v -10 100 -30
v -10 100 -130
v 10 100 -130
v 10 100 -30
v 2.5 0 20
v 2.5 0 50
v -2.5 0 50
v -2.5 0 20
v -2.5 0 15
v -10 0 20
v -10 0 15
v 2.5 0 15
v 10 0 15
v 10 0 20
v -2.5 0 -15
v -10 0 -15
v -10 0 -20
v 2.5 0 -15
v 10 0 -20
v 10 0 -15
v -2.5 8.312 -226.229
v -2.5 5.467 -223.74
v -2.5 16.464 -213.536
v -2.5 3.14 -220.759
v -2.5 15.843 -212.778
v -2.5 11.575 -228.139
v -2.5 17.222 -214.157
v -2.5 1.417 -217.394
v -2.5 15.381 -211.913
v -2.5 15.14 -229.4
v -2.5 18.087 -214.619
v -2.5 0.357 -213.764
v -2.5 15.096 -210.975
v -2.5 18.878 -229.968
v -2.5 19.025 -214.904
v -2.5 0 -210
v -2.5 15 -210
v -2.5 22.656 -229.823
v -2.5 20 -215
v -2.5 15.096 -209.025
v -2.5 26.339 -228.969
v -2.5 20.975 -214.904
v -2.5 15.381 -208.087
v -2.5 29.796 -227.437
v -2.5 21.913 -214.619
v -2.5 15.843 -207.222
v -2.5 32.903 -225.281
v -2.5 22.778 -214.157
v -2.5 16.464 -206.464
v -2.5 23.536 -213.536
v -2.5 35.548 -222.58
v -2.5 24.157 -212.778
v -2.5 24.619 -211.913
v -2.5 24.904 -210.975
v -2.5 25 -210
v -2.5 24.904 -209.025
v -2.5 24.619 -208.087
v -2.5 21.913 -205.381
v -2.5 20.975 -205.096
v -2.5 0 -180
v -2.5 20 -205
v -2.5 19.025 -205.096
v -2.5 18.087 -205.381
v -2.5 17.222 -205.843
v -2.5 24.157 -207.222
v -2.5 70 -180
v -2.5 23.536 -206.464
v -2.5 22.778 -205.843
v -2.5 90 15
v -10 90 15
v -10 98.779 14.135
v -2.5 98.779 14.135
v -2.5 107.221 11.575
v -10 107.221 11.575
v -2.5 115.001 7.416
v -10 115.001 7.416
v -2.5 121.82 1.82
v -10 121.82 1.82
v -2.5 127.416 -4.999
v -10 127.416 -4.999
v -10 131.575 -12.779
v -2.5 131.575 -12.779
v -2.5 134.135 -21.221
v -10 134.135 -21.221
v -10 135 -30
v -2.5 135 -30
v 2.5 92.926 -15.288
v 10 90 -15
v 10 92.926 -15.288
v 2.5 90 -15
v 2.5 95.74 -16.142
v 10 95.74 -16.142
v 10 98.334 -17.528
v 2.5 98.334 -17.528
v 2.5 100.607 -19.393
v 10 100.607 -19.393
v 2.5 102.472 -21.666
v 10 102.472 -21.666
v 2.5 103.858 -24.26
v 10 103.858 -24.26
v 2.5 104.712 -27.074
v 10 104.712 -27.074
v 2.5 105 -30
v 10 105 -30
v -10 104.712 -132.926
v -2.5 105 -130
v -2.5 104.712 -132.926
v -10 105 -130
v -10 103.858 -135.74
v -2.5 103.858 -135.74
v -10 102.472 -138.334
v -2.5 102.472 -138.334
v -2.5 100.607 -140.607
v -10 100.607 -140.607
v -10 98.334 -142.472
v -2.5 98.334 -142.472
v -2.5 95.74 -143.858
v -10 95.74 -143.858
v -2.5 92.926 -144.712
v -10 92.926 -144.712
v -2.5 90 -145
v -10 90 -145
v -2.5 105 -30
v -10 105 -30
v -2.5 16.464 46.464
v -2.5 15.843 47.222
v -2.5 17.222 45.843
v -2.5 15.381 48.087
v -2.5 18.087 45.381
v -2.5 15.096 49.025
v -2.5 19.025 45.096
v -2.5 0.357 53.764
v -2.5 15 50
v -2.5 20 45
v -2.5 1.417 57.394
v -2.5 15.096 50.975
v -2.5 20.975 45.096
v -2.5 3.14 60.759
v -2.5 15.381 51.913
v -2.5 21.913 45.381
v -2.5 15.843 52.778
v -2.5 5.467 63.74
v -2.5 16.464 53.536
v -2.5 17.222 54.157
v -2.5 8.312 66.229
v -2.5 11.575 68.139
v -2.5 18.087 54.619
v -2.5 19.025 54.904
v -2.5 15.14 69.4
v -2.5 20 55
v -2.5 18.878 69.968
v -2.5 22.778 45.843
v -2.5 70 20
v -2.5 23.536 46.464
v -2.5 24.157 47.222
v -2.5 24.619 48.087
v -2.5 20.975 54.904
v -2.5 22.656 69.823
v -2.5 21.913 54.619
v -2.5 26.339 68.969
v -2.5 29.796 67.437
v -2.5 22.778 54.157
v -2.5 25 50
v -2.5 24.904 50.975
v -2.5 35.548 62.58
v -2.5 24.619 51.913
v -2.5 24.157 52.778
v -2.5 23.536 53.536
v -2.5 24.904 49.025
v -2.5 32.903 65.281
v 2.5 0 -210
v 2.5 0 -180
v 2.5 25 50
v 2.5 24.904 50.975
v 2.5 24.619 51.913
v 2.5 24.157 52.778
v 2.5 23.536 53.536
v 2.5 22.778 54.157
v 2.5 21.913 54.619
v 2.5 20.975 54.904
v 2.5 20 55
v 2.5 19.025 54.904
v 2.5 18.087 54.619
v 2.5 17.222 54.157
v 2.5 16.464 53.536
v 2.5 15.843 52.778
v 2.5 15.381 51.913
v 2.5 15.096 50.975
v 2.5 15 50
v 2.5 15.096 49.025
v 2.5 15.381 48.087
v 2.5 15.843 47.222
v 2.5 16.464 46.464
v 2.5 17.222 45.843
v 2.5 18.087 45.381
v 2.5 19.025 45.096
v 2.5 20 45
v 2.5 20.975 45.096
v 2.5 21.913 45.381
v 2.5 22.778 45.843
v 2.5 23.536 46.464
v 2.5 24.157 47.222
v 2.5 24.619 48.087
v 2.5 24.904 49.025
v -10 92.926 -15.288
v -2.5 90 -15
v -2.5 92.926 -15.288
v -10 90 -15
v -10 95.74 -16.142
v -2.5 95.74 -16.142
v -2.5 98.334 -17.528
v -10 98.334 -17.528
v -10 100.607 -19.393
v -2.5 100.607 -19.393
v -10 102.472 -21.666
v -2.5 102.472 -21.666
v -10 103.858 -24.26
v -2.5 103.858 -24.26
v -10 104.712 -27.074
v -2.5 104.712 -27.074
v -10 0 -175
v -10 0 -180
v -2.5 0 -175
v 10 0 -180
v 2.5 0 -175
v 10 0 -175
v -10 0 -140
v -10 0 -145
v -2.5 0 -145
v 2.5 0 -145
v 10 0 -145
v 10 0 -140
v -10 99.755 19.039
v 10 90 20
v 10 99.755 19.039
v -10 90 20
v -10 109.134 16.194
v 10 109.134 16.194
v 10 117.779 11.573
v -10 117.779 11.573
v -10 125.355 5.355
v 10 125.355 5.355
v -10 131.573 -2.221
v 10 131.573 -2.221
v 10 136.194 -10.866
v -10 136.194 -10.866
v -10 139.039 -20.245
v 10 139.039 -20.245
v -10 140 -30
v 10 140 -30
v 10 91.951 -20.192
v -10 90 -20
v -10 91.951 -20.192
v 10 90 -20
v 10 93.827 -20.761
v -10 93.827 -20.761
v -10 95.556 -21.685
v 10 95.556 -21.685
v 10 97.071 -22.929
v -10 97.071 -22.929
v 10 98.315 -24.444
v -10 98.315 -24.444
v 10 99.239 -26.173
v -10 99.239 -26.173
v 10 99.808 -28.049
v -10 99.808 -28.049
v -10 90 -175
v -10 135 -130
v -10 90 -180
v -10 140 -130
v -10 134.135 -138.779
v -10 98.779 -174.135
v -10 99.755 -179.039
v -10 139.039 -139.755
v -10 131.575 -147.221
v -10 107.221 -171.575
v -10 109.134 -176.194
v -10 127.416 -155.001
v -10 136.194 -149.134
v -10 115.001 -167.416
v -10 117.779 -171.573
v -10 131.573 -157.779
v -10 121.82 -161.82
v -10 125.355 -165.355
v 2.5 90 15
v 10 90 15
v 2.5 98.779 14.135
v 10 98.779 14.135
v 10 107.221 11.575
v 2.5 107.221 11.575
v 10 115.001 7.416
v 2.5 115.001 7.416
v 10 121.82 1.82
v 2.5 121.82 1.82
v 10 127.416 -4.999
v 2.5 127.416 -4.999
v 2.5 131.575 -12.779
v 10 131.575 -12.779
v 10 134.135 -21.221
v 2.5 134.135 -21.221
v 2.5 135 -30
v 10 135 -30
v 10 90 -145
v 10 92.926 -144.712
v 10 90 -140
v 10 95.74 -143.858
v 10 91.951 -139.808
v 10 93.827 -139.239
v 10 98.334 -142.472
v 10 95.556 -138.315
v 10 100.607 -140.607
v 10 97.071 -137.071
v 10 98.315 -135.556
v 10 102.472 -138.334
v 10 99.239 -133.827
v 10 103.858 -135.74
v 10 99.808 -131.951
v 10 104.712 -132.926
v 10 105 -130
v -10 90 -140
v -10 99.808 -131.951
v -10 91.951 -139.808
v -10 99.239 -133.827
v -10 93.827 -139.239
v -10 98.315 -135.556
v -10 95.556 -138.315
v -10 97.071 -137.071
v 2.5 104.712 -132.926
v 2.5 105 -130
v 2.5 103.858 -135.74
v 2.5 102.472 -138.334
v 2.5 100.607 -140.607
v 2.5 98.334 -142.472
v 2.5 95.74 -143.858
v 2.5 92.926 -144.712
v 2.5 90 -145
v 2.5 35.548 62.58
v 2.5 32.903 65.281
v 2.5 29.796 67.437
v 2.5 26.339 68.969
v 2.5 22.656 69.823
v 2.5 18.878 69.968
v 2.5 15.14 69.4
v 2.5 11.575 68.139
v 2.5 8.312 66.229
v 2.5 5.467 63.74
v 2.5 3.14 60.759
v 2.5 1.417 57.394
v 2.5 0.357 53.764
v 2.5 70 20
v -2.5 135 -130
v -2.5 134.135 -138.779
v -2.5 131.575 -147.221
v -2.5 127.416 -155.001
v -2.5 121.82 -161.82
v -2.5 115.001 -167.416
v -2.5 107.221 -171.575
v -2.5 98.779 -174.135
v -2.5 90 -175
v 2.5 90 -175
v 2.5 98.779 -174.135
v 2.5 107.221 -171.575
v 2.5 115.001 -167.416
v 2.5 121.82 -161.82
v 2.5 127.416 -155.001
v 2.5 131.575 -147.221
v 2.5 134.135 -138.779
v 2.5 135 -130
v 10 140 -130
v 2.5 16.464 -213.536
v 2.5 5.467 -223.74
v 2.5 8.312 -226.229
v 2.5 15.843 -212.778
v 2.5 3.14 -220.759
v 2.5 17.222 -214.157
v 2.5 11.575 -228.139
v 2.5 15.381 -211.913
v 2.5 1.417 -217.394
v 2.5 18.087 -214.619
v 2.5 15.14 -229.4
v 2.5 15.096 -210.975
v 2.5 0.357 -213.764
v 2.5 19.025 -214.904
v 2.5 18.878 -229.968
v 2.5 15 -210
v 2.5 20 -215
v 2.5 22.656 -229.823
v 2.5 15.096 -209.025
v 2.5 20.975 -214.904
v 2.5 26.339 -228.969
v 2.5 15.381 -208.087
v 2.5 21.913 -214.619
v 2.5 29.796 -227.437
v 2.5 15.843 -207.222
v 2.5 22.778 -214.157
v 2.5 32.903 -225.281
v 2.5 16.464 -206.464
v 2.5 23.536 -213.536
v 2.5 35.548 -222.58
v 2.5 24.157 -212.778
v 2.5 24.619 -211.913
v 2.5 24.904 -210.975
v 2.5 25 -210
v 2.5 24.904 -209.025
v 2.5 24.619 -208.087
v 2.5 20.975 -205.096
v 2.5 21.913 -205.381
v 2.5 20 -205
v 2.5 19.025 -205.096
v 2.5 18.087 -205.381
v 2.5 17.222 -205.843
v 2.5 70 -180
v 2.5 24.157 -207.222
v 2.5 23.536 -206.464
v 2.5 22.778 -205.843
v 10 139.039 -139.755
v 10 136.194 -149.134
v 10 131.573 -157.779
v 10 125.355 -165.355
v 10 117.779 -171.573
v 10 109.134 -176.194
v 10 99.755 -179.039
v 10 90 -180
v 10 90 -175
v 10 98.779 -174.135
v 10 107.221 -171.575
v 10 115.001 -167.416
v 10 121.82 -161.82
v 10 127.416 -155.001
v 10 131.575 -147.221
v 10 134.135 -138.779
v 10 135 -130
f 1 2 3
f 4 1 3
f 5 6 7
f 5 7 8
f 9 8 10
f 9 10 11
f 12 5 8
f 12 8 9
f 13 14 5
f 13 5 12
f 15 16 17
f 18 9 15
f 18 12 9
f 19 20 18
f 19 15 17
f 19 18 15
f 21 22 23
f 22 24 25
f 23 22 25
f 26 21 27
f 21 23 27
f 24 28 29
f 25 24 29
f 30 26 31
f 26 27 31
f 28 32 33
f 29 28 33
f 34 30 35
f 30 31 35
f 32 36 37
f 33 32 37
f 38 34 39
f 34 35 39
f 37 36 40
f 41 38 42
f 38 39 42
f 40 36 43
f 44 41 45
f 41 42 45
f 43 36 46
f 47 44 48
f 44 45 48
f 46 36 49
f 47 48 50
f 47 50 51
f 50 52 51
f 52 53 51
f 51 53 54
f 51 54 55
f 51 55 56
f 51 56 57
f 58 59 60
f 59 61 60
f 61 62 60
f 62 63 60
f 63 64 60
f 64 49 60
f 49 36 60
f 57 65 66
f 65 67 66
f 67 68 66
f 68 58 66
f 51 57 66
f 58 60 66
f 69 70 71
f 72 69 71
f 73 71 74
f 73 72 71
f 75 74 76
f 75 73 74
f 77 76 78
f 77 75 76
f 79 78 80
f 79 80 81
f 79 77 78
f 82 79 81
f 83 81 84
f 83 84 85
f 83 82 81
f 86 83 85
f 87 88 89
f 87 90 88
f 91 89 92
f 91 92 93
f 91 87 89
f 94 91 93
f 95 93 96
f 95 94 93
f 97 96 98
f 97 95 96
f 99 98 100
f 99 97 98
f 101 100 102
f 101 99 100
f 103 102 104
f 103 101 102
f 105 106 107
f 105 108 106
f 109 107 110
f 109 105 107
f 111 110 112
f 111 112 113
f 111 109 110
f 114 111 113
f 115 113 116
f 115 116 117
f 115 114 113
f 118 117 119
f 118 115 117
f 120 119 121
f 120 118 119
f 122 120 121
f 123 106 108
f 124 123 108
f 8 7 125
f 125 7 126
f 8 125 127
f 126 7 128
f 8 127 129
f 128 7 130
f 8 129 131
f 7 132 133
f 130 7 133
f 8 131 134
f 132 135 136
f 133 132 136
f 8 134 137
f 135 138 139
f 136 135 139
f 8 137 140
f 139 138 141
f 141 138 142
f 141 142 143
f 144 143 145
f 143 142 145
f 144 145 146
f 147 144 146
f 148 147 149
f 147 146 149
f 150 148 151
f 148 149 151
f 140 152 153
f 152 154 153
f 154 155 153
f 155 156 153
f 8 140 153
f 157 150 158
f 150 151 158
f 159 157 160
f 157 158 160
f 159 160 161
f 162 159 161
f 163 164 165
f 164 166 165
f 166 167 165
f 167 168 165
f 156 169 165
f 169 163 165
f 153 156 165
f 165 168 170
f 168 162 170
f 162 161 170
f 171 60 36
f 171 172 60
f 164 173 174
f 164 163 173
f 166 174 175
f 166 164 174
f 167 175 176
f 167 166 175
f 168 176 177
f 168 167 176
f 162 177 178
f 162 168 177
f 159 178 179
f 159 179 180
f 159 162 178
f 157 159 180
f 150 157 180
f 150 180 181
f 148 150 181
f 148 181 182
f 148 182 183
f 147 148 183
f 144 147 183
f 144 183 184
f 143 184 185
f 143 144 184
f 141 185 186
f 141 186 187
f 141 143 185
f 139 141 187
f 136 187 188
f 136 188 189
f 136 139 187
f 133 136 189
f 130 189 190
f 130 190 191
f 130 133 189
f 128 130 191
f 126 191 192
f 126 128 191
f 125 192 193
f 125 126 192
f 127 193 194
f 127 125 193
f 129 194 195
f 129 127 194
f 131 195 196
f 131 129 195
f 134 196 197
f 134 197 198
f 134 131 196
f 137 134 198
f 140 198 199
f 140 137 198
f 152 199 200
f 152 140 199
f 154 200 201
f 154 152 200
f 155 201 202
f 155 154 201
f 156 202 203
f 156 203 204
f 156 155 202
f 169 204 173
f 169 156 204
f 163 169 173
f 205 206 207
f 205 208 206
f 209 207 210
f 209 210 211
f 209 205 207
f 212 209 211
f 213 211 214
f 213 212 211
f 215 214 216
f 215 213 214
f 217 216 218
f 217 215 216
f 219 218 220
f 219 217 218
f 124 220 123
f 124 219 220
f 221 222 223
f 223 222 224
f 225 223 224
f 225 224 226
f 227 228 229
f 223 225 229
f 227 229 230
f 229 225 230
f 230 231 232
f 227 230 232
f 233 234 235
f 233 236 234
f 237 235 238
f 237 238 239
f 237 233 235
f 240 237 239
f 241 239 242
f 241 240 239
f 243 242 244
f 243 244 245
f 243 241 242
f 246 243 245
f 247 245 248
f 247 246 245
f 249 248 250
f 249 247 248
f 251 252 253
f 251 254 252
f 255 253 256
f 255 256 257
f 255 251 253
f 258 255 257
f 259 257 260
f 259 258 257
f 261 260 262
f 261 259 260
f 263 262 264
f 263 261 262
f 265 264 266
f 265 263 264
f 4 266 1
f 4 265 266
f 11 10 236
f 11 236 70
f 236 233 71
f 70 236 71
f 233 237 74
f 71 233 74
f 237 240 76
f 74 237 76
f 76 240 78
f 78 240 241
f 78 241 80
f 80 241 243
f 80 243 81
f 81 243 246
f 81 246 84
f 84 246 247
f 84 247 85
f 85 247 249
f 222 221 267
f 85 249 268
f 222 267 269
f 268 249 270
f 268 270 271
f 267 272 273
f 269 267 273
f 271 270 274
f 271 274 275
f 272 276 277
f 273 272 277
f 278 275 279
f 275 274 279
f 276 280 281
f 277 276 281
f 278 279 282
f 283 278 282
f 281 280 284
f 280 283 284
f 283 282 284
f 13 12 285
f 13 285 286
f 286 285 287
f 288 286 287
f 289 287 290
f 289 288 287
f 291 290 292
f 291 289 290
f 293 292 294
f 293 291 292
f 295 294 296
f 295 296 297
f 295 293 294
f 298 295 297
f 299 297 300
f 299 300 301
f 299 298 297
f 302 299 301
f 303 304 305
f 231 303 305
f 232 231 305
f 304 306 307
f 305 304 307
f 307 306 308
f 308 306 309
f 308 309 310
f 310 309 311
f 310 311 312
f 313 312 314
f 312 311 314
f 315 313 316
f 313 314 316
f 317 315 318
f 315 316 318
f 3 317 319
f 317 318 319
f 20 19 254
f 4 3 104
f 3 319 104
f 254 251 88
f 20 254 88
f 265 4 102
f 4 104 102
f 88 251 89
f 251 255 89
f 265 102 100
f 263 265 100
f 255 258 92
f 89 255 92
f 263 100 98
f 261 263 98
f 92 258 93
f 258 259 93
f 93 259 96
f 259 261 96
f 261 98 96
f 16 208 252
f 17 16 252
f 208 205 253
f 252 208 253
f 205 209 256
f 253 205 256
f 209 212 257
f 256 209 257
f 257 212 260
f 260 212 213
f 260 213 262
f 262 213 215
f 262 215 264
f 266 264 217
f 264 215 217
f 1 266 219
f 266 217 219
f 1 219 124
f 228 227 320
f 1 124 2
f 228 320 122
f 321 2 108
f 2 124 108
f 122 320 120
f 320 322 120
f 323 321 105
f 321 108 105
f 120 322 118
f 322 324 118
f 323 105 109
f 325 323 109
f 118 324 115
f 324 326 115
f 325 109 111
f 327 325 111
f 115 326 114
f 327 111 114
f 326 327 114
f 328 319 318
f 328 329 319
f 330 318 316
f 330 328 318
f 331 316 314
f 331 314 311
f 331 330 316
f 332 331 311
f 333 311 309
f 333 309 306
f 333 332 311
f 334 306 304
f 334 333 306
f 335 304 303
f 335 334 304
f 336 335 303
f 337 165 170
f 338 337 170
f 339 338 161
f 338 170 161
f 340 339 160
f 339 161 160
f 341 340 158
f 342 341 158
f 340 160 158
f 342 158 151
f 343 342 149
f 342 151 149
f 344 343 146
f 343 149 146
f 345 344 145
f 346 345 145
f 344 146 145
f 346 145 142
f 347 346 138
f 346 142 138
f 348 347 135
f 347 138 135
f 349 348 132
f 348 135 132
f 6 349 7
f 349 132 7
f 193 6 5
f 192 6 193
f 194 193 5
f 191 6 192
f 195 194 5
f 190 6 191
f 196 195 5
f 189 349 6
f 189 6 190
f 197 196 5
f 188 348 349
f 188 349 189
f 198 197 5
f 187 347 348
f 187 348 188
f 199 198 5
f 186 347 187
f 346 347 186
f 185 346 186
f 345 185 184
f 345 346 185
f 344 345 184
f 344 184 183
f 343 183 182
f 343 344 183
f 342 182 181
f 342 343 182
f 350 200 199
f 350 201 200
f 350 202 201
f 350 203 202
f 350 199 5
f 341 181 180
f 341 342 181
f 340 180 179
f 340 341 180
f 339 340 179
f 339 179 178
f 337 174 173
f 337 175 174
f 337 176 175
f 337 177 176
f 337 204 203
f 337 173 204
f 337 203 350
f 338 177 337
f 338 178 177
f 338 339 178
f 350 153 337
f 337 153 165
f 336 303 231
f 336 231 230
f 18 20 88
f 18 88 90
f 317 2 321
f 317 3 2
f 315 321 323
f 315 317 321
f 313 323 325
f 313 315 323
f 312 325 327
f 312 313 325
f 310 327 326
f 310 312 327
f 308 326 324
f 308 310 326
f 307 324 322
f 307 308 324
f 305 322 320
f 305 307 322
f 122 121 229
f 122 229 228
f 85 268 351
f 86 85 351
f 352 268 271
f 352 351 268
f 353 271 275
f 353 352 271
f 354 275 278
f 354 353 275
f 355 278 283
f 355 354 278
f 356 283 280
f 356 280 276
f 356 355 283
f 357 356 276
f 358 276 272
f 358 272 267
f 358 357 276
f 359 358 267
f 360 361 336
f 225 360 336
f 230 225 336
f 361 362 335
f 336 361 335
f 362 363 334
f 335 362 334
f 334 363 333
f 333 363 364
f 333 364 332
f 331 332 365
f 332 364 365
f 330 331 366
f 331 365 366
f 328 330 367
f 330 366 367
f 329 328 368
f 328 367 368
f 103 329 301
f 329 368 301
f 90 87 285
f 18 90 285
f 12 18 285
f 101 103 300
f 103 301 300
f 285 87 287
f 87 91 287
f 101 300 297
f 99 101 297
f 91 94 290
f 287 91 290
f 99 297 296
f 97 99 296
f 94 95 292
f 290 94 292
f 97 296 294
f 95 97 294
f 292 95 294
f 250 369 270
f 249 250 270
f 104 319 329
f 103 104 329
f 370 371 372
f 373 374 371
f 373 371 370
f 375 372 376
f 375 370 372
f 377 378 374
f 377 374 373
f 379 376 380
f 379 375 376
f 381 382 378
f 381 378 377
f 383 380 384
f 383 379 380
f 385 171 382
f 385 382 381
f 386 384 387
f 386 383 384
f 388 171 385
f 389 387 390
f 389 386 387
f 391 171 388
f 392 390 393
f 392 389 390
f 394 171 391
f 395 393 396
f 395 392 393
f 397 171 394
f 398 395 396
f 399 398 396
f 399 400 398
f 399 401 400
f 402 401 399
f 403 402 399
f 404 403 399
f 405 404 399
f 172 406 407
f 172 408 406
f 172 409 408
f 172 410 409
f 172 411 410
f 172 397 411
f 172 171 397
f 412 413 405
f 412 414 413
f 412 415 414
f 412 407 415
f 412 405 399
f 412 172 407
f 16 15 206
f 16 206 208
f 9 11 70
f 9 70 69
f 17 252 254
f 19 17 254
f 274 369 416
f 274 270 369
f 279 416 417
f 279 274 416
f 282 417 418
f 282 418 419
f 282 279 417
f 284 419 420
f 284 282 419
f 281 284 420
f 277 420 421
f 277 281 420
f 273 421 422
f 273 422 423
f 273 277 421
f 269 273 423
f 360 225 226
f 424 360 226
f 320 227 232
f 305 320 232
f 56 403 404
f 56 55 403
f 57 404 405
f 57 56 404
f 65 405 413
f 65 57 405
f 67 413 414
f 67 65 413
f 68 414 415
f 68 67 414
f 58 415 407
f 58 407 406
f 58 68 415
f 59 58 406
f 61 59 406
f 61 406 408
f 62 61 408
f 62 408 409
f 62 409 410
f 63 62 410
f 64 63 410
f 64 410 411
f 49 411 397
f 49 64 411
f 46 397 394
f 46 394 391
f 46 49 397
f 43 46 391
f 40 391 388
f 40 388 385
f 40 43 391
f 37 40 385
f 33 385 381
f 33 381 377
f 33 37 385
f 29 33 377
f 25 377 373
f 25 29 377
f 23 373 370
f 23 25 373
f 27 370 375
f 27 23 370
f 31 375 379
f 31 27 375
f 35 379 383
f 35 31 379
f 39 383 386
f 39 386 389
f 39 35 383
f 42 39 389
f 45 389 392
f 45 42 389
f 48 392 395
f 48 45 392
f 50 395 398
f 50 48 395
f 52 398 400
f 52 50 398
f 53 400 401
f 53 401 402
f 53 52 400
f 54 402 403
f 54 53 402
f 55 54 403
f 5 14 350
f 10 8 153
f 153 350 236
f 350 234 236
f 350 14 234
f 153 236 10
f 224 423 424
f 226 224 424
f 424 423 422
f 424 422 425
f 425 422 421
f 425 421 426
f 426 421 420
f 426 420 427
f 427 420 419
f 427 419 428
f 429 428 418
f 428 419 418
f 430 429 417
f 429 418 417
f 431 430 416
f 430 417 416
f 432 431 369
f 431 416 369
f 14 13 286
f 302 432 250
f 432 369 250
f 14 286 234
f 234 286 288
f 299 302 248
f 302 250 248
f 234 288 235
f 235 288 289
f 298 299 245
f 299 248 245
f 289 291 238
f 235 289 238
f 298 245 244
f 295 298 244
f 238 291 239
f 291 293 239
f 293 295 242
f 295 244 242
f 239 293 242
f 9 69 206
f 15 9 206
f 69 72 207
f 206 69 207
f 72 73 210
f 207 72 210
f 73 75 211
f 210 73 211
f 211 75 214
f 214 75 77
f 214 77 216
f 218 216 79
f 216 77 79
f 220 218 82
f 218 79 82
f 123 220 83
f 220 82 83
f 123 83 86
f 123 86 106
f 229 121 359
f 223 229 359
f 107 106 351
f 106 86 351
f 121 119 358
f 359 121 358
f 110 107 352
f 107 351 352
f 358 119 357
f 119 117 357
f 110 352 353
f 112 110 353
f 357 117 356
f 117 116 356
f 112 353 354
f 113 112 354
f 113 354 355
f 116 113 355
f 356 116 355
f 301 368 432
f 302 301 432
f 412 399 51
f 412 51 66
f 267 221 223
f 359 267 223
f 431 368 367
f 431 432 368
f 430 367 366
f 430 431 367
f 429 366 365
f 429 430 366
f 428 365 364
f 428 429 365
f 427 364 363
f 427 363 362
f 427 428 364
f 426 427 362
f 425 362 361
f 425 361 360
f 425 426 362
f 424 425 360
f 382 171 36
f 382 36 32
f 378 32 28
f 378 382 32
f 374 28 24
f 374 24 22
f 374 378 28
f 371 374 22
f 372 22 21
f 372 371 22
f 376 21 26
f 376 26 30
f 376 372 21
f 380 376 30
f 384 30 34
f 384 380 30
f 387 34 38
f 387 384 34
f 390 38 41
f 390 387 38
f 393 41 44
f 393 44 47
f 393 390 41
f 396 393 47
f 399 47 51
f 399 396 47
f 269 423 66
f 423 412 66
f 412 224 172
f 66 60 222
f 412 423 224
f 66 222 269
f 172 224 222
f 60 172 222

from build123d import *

# Parameters (mm, degrees)
F3_R     = 5
F4_DEPTH = 2.5


with BuildPart() as f2:
    # F2: sweep along a path in F1
    with BuildLine(Plane.YZ) as f2_path:
        Line((0, -20), (90, -20))
        ThreePointArc((90, -20), (97.071068, -22.928932), (100, -30))
        Line((100, -30), (100, -130))
        ThreePointArc((100, -130), (97.071068, -137.071068), (90, -140))
        Line((90, -140), (0, -140))
    # F0 (on Front) → F2 (sweep)
    with BuildSketch(Plane.XZ):
        Polygon((2.5, -12), (2.5, 0), (2.5, 12), (2.5, 15), (5.5, 15), (10, 15), (10, 20), (0, 20), (-10, 20), (-10, 15), (-5.5, 15), (-2.5, 15), (-2.5, 12), (-2.5, 0), (-2.5, -12), (-2.5, -15), (-5.5, -15), (-10, -15), (-10, -20), (0, -20), (10, -20), (10, -15), (5.5, -15), (2.5, -15), align=None)
    sweep(path=f2_path.line)

    # F3 (on Right) → F4 (join, symmetric)
    with BuildSketch(Plane.YZ):
        with BuildLine():
            Line((0, 50), (0, 20))
            Line((0, 20), (70, 20))
            Line((70, 20), (35.548045, 62.580075))
            ThreePointArc((35.548045, 62.580075), (13.327703, 68.854189), (0, 50))
        make_face()
        with Locations((20, 50)):
            Circle(F3_R, mode=Mode.SUBTRACT)
        with BuildLine():
            Line((0, -180), (0, -210))
            ThreePointArc((0, -210), (13.327703, -228.854189), (35.548045, -222.580075))
            Line((35.548045, -222.580075), (70, -180))
            Line((70, -180), (0, -180))
        make_face()
        with Locations((20, -210)):
            Circle(F3_R, mode=Mode.SUBTRACT)
    extrude(amount=F4_DEPTH, both=True)


solid = f2.part
